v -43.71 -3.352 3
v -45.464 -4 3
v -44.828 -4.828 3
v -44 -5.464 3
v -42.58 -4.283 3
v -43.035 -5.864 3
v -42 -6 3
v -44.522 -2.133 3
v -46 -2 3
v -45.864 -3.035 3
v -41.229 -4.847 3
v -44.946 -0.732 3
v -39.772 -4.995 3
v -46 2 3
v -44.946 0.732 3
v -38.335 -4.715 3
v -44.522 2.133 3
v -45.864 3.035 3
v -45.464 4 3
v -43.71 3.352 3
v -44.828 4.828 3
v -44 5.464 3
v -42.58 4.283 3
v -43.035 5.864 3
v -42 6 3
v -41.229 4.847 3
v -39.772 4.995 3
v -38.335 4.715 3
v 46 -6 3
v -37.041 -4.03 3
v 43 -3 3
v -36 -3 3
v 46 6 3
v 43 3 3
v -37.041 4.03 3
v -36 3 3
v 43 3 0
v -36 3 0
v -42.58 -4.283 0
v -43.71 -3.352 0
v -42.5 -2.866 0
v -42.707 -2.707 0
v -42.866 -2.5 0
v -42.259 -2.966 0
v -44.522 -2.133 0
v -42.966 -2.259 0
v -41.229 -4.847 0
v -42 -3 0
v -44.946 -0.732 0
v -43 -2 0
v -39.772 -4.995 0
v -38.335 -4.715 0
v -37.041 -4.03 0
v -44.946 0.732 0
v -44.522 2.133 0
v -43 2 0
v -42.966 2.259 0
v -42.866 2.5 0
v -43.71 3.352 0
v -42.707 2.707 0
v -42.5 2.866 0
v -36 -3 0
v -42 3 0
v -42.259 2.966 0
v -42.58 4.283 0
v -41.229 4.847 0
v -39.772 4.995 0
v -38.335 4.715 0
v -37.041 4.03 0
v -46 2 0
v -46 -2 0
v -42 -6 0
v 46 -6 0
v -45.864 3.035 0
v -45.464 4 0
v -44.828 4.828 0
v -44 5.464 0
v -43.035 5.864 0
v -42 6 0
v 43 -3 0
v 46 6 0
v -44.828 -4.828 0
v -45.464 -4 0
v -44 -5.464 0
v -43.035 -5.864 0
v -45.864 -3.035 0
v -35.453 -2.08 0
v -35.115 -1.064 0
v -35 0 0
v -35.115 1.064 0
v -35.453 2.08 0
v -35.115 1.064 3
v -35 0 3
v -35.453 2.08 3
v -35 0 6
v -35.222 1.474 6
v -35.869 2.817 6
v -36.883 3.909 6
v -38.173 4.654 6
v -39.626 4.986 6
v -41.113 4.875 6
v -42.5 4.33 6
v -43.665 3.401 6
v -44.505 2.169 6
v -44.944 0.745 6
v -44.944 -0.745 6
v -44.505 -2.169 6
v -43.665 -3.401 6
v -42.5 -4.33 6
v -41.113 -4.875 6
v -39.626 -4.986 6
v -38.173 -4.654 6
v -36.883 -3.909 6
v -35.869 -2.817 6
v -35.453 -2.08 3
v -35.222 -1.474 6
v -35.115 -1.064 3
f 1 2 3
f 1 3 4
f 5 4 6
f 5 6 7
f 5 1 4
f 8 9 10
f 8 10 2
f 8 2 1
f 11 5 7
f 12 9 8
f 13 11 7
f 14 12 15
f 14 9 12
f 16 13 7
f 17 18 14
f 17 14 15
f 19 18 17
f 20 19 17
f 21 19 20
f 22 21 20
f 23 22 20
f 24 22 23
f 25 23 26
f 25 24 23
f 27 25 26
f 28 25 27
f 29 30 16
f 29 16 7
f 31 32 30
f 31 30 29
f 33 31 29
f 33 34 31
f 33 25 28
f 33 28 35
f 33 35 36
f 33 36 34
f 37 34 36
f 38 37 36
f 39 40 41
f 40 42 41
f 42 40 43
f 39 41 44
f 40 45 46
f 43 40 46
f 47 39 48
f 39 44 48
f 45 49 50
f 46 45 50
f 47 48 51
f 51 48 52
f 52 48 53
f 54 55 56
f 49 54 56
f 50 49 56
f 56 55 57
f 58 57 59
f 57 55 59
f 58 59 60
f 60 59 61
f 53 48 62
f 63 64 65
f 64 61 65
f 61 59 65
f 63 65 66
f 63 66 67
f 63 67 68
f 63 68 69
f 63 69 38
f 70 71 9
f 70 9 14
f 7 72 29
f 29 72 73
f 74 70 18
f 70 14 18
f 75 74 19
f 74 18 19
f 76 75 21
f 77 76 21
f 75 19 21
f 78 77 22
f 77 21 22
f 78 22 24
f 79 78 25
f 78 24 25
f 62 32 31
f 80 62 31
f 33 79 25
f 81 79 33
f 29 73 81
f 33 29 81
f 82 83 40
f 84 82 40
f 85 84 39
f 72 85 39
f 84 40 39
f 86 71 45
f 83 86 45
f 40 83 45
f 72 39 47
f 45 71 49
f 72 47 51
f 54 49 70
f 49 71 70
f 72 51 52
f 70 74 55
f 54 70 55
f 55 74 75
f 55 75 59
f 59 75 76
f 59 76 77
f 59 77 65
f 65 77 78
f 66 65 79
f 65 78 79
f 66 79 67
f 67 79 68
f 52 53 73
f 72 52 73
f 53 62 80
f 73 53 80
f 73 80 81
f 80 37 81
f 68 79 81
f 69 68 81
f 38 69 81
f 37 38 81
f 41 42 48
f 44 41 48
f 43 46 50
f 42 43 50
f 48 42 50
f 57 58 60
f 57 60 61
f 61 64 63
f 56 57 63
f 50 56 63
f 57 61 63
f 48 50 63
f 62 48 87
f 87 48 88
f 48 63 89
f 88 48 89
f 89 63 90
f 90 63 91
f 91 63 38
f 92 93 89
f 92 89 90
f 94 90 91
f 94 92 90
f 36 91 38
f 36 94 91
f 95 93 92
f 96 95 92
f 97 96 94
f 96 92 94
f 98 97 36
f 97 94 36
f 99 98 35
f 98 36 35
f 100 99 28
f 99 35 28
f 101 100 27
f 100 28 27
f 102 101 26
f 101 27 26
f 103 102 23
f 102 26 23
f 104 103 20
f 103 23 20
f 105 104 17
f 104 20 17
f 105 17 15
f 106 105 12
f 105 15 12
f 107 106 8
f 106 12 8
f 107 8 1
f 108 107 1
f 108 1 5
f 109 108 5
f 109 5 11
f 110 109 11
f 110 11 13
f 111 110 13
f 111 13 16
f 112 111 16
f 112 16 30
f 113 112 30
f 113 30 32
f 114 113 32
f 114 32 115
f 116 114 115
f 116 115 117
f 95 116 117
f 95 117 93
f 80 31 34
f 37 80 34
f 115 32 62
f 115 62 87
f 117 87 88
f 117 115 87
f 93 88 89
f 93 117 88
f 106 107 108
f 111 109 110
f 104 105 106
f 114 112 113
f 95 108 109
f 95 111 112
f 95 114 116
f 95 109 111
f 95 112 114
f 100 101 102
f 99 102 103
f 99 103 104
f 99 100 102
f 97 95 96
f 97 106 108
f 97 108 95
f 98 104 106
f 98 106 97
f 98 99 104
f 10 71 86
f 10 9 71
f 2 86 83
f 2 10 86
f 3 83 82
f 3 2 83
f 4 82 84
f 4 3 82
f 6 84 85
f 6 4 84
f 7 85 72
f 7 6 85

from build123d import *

# Parameters (mm, degrees)
SKETCH1_W                = 92
SKETCH1_H                = 12
BOSS_EXTRUDE1_DEPTH      = 3
FILLET1_R                = 4
CUT_EXTRUDE1_DEPTH       = 3
SKETCH3_R                = 5
BOSS_EXTRUDE2_DEPTH      = 3
BOSS_EXTRUDE2_DEPTH_BACK = 3


with BuildPart() as part:
    # Sketch1 → Boss-Extrude1 (new body)
    with BuildSketch(Plane.XY):
        Rectangle(SKETCH1_W, SKETCH1_H)
    extrude(amount=BOSS_EXTRUDE1_DEPTH)

    # Fillet1
    fillet1_edges = [part.edges().sort_by_distance(p)[0] for p in [
        (-46, -6, 1.5),
        (-46, 6, 1.5),
    ]]
    fillet(fillet1_edges, radius=FILLET1_R)

    # Sketch2 → Cut-Extrude1 (cut)
    with BuildSketch(Plane.XY.offset(3)):
        with BuildLine():
            Line((-43, 2), (-43, -2))
            ThreePointArc((-43, -2), (-42.707106781, -2.707106781), (-42, -3))
            Line((-42, -3), (43, -3))
            Line((43, -3), (43, 3))
            Line((43, 3), (-42, 3))
            ThreePointArc((-42, 3), (-42.707106781, 2.707106781), (-43, 2))
        make_face()
    extrude(amount=-CUT_EXTRUDE1_DEPTH, mode=Mode.SUBTRACT)

    # Sketch3 → Boss-Extrude2 (add, two sides)
    with BuildSketch(Plane.XY.offset(3)) as boss_extrude2_sk:
        with Locations((-40, 0)):
            Circle(SKETCH3_R)
    extrude(amount=BOSS_EXTRUDE2_DEPTH)
    extrude(boss_extrude2_sk.sketch, amount=-BOSS_EXTRUDE2_DEPTH_BACK)


solid = part.part
